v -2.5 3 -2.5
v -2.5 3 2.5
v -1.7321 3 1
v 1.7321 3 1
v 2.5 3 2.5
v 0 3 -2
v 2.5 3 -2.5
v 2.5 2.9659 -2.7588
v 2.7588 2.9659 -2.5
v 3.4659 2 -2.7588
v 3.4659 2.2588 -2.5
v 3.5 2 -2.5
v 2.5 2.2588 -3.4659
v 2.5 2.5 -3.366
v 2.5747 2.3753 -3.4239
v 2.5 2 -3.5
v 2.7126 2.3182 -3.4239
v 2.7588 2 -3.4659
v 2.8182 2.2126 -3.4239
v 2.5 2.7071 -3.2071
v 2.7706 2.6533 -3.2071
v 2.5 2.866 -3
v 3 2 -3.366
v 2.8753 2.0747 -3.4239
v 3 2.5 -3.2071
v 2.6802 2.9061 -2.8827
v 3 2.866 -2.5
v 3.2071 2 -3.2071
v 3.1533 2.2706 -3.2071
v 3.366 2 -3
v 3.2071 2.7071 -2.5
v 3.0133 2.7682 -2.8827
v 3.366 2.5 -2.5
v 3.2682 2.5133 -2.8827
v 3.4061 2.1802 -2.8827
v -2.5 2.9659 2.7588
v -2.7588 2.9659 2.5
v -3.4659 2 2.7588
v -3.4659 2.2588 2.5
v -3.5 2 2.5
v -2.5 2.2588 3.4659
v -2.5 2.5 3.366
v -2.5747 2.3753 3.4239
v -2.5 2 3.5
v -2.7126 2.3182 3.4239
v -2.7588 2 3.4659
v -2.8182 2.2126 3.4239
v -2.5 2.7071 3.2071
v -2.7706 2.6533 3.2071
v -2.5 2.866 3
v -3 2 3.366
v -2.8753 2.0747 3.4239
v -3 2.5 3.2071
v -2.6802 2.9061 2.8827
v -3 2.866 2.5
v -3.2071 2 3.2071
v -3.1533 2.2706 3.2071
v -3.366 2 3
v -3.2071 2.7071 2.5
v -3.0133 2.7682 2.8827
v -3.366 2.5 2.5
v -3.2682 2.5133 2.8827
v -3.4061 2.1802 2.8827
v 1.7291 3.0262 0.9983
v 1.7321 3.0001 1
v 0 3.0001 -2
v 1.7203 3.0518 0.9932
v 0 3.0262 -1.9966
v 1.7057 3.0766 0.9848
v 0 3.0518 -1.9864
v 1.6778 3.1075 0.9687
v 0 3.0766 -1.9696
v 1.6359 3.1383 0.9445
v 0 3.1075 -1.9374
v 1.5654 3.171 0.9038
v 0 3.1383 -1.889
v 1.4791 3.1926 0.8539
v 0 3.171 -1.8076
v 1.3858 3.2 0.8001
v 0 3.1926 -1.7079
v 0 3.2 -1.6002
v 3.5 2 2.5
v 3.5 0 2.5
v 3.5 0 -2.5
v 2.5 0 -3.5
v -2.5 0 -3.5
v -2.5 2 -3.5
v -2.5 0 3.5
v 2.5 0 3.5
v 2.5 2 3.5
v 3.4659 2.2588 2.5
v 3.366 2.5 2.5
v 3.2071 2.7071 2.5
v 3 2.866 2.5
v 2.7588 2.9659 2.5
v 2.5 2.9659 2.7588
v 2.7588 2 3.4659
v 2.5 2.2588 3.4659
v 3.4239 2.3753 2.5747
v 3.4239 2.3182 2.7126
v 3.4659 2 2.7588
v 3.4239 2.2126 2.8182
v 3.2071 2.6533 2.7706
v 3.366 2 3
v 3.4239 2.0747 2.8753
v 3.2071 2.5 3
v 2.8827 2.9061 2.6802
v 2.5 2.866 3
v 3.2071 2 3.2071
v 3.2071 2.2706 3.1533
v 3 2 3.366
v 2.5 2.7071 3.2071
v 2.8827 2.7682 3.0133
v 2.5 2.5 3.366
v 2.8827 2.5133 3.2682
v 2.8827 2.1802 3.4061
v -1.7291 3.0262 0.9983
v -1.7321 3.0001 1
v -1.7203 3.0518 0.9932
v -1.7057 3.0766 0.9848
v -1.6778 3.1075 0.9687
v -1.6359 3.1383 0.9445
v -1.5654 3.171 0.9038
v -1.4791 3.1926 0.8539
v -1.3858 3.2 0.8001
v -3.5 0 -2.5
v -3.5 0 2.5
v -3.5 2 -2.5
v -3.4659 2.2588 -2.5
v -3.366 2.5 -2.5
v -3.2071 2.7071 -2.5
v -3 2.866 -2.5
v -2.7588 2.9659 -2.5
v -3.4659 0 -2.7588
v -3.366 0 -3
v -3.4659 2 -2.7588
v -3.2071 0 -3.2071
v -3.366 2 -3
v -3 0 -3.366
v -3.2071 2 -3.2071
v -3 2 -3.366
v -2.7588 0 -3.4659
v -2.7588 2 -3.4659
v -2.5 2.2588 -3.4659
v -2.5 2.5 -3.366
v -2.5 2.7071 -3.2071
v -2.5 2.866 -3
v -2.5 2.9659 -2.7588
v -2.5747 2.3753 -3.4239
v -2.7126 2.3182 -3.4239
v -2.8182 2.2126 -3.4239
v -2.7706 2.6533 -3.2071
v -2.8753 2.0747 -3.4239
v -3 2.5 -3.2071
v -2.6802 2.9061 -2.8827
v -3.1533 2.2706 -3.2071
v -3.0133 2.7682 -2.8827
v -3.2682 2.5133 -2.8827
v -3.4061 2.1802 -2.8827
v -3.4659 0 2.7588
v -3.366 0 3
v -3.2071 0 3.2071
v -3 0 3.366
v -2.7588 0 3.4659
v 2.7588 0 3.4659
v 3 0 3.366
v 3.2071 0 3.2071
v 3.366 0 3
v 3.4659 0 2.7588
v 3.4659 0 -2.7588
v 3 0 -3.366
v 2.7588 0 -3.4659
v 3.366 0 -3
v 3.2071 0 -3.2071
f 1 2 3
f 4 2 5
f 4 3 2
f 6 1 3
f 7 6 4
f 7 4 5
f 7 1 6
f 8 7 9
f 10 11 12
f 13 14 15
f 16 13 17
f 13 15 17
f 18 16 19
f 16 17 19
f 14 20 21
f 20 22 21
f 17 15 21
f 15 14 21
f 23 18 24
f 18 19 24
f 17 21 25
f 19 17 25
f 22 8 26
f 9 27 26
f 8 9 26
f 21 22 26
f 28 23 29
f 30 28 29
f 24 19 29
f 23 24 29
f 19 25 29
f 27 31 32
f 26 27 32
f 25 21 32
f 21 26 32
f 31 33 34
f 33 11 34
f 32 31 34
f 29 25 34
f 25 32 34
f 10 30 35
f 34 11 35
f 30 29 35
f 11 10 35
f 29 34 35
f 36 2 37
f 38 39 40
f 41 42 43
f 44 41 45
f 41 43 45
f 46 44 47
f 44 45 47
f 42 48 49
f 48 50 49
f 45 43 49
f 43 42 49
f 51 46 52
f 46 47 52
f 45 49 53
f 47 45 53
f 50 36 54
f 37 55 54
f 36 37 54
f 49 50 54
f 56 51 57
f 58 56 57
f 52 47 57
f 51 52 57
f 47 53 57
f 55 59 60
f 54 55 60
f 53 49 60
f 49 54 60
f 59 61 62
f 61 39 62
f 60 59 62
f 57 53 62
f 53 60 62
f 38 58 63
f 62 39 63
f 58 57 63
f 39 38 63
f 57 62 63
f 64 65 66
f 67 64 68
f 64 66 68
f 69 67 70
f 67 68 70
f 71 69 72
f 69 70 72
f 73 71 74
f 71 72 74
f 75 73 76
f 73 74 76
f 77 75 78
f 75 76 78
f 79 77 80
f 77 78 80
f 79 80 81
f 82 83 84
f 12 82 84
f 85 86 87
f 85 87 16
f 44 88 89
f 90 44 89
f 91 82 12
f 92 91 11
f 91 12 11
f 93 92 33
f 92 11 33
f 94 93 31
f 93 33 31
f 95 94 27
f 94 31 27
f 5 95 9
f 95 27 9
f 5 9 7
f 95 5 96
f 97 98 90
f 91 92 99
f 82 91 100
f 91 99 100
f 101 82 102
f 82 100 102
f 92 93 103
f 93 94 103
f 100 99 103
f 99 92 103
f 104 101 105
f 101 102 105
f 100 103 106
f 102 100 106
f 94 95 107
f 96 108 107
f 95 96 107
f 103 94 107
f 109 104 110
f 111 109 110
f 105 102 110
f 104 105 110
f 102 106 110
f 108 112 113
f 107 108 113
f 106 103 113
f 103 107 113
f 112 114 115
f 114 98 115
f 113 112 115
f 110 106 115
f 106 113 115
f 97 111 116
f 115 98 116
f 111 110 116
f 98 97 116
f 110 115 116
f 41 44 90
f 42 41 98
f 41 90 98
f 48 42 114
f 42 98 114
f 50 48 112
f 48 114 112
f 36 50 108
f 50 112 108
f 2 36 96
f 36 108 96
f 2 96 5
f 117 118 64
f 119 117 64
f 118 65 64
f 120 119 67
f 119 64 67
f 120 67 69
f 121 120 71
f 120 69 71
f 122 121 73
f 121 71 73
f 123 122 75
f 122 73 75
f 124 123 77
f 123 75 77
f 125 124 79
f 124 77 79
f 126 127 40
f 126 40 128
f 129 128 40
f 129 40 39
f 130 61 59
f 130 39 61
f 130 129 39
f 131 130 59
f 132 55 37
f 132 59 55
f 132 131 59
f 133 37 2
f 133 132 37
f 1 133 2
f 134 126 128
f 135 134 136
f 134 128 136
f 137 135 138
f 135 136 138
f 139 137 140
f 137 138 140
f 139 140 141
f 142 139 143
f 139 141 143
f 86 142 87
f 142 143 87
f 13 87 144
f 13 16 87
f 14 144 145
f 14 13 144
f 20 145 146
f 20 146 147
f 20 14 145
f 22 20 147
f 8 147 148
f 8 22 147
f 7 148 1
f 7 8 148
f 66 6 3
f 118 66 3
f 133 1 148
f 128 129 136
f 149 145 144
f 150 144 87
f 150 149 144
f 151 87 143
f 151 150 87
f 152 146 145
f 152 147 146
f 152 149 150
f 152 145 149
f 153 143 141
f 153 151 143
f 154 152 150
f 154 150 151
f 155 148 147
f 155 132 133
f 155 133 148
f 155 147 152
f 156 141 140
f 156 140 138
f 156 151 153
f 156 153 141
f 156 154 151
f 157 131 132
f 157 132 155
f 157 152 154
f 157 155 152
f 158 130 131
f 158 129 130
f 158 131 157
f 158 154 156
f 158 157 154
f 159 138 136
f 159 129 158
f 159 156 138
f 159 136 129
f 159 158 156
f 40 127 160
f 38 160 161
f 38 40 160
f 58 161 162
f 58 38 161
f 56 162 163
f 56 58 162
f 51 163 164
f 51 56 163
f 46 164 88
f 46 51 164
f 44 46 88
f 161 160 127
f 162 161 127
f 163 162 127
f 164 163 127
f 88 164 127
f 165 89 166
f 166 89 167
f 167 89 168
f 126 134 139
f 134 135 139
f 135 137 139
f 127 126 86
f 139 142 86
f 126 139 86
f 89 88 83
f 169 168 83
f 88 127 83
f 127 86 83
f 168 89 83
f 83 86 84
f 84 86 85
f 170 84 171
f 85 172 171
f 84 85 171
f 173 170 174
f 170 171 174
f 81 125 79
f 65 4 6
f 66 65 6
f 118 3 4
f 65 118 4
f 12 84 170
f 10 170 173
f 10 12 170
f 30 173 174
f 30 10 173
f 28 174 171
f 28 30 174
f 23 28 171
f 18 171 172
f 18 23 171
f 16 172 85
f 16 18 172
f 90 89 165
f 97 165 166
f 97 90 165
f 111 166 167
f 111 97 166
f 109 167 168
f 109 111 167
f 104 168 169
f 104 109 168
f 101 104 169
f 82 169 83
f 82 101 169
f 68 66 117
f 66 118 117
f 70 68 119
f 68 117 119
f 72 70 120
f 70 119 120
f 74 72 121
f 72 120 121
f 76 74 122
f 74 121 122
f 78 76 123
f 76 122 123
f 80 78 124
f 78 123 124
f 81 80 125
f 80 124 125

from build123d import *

# Parameters (mm, degrees)
SKETCH1_W           = 7
SKETCH1_H           = 7
BOSS_EXTRUDE1_DEPTH = 3
FILLET1_R           = 1
BOSS_EXTRUDE2_DEPTH = 0.2
FILLET2_R           = 0.2


with BuildPart() as part:
    # Sketch1 → Boss-Extrude1 (new body)
    with BuildSketch(Plane(origin=(0, 0, 0), x_dir=(1, 0, 0), z_dir=(0, 1, 0))):
        Rectangle(SKETCH1_W, SKETCH1_H)
    extrude(amount=BOSS_EXTRUDE1_DEPTH)

    # Fillet1
    fillet1_edges = [part.edges().sort_by_distance(p)[0] for p in [
        (-3.5, 3, 0),
        (0, 3, 3.5),
        (3.5, 3, 0),
        (0, 3, -3.5),
        (3.5, 1.5, 3.5),
        (-3.5, 1.5, 3.5),
        (-3.5, 1.5, -3.5),
        (3.5, 1.5, -3.5),
    ]]
    fillet(fillet1_edges, radius=FILLET1_R)

    # Sketch2 → Boss-Extrude2 (add)
    with BuildSketch(Plane(origin=(0, 3, 0), x_dir=(1, 0, 0), z_dir=(0, 1, 0))):
        Polygon((0, 2), (-1.732050808, -1), (1.732050808, -1), align=None)
    extrude(amount=BOSS_EXTRUDE2_DEPTH)

    # Fillet2
    fillet2_edges = [part.edges().sort_by_distance(p)[0] for p in [
        (-0.866025404, 3.2, -0.5),
        (0.866025404, 3.2, -0.5),
        (0, 3.2, 1),
    ]]
    fillet(fillet2_edges, radius=FILLET2_R - 0.0001)  # a hair under: the kernel refuses the full size


solid = part.part
